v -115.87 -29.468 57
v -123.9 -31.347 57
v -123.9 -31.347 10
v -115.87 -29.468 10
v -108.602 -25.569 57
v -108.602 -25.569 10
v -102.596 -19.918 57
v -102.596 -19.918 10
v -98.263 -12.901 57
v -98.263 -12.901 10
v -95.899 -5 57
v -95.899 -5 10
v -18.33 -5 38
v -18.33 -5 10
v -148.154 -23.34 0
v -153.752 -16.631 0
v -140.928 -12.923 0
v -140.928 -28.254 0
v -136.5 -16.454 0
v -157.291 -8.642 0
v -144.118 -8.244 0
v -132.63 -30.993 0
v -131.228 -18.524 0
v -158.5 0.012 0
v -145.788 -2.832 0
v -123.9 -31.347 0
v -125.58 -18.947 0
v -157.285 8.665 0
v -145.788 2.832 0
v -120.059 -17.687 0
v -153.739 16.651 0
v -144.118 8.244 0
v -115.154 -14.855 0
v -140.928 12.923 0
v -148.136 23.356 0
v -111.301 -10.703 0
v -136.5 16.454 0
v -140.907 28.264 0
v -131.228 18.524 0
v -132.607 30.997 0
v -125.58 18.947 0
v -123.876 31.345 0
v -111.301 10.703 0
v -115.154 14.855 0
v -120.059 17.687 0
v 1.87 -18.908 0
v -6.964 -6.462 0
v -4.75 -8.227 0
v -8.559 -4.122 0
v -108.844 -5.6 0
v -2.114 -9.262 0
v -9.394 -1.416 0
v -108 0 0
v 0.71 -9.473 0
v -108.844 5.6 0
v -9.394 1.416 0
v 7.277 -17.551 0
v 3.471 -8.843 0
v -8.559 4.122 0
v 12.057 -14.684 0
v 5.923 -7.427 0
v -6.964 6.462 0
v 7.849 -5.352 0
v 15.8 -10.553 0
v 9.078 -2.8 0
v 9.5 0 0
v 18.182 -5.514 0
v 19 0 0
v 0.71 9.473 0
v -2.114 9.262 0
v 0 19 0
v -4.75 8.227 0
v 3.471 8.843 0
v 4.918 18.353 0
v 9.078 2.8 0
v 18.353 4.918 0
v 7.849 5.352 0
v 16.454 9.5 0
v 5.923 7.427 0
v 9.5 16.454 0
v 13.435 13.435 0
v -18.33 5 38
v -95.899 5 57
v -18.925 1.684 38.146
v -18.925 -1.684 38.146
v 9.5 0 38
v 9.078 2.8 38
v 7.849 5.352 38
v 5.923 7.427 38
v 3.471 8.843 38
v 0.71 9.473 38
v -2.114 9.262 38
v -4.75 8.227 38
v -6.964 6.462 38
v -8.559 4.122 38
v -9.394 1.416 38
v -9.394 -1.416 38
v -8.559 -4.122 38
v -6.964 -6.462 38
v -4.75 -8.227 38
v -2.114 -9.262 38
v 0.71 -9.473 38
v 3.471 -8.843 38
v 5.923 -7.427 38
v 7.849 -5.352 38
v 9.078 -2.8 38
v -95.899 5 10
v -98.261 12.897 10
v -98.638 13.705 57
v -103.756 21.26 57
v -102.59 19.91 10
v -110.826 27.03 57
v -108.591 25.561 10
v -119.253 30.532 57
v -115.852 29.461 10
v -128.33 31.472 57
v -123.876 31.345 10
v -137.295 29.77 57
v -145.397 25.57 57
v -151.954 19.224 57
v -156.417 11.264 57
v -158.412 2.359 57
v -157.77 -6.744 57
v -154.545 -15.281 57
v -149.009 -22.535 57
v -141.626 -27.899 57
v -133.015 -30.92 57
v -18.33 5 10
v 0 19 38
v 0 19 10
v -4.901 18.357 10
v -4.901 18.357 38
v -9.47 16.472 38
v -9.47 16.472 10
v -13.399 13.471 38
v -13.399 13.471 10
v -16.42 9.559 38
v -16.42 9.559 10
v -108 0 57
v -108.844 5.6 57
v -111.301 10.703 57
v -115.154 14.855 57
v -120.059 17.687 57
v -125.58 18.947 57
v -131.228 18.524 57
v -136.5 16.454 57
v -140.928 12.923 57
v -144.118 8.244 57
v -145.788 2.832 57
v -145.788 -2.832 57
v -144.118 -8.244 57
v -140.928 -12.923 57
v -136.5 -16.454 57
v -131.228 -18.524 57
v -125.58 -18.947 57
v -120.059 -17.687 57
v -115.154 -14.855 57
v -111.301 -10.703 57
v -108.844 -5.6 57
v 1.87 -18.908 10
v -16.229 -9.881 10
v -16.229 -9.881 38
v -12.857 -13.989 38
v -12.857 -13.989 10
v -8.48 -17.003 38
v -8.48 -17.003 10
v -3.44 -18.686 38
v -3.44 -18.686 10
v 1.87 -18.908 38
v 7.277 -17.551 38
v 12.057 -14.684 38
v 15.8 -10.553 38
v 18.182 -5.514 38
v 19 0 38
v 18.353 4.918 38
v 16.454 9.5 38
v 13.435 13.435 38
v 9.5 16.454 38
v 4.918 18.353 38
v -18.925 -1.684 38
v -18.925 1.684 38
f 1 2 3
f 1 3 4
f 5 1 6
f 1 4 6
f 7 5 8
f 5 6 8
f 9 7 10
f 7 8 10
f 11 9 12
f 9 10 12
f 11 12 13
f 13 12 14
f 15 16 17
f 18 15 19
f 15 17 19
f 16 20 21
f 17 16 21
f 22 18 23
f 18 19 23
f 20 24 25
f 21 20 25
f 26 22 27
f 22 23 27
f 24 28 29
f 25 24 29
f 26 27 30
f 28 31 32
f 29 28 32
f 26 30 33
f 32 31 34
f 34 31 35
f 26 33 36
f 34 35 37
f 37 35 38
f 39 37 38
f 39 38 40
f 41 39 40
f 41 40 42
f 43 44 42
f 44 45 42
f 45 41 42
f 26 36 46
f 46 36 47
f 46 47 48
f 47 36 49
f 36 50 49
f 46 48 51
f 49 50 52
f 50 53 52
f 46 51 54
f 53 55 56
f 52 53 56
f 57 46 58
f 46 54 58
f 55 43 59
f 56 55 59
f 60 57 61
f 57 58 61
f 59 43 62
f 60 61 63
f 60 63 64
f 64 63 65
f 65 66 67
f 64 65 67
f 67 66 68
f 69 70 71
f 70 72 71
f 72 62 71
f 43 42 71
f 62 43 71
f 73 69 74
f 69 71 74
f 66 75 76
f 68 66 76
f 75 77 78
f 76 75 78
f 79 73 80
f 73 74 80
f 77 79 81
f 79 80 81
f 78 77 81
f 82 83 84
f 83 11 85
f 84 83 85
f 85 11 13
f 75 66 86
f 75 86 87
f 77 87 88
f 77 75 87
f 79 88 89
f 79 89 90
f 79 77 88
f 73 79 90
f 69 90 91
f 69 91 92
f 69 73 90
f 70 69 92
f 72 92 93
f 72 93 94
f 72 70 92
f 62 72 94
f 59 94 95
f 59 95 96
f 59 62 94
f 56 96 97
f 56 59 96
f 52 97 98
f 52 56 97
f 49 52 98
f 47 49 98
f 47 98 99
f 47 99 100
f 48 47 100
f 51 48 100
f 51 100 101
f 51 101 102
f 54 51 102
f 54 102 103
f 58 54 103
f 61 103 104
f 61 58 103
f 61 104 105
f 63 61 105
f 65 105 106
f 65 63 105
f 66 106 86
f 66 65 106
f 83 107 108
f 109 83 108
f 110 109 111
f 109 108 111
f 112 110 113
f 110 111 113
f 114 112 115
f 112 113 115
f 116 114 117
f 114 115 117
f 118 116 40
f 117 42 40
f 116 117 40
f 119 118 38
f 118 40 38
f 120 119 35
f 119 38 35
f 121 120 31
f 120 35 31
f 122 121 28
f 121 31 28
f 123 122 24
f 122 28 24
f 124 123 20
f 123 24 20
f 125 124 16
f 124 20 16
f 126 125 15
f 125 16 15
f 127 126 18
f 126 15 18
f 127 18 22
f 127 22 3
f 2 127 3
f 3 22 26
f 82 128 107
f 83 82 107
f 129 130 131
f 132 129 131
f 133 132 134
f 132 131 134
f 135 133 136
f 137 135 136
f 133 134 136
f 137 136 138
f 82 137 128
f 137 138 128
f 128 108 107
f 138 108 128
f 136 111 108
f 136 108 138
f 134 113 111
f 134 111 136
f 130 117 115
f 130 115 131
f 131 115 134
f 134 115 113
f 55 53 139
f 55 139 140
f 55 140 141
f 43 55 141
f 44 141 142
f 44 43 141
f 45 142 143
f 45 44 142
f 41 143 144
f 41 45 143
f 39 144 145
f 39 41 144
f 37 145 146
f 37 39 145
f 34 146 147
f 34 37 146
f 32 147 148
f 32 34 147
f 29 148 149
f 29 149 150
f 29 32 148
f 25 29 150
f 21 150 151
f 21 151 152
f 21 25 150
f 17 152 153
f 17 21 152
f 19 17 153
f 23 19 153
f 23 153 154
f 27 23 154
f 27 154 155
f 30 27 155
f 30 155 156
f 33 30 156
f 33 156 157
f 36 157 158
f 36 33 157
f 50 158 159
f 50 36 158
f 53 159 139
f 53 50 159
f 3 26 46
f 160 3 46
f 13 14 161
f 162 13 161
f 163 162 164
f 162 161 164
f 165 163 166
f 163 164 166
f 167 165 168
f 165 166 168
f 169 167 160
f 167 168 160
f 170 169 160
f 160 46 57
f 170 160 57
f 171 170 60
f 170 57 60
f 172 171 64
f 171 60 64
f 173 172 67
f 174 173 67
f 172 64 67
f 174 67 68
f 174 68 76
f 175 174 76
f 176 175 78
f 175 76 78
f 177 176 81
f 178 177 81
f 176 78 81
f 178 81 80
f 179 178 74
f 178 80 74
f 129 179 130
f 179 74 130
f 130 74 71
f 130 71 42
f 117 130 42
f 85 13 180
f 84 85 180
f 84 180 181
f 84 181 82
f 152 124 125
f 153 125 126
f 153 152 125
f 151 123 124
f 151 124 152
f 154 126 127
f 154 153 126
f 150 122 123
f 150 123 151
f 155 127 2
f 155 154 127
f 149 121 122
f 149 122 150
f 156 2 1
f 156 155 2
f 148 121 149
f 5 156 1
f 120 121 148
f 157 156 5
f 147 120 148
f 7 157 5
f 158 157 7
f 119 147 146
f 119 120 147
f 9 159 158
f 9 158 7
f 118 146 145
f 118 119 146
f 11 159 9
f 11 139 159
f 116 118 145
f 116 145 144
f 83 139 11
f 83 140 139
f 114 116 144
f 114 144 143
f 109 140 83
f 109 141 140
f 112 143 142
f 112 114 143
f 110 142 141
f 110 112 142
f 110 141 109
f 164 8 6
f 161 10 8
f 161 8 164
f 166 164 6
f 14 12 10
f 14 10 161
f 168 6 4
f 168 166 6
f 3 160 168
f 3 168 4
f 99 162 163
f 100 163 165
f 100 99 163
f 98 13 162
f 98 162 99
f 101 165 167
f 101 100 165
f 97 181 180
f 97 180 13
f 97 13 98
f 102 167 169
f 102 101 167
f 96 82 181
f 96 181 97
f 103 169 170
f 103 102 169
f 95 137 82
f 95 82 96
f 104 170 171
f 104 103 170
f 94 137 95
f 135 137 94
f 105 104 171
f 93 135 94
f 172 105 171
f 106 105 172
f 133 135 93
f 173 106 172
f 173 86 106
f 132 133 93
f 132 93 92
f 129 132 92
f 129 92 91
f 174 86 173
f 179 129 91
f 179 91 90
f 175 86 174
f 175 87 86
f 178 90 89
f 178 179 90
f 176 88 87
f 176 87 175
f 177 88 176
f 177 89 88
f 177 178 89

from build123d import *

# Parameters (mm, degrees)
F0_R     = 19
F1_DEPTH = 57
F2_DEPTH = 10
F0_R_2   = 9.5
F3_DEPTH = 38
F5_DEPTH = 57
F7_DEPTH = 36.501


with BuildPart() as f1:
    # F0 (on Top) → F1 (new body)
    with BuildSketch(Plane.XY):
        with BuildLine():
            ThreePointArc((-95.8993569198, 5), (-105.4051754039, 22.9328051198), (-123.8763790613, 31.3447442521))
            ThreePointArc((-123.8763790613, 31.3447442521), (-158.499997838, 0.011670713), (-123.8996062992, -31.3470502424))
            ThreePointArc((-123.8996062992, -31.3470502424), (-105.4136734635, -22.940804403), (-95.8993569198, -5))
            ThreePointArc((-95.8993569198, -5), (-95.5999979536, -2.50796162), (-95.5, 0))
            ThreePointArc((-95.5, 0), (-95.5999979536, 2.50796162), (-95.8993569198, 5))
        make_face()
        with Locations((-127, 0)):
            Circle(F0_R, mode=Mode.SUBTRACT)
    extrude(amount=F1_DEPTH)

    # F0 (on Top) → F2 (join)
    with BuildSketch(Plane.XY):
        with BuildLine():
            Line((-123.8996062992, -31.3470502424), (1.8700787402, -18.9077445907))
            ThreePointArc((1.8700787402, -18.9077445907), (-10.7745572419, -15.6495660081), (-18.3303027798, -5))
            Line((-18.3303027798, -5), (-95.8993569198, -5))
            ThreePointArc((-95.8993569198, -5), (-105.4136734635, -22.940804403), (-123.8996062992, -31.3470502424))
        make_face()
        with BuildLine():
            ThreePointArc((-18.3303027798, 5), (-11.5325625947, 15.0996688705), (0, 19))
            Line((0, 19), (-123.8763790613, 31.3447442521))
            ThreePointArc((-123.8763790613, 31.3447442521), (-105.4051754039, 22.9328051198), (-95.8993569198, 5))
            Line((-95.8993569198, 5), (-18.3303027798, 5))
        make_face()
    extrude(amount=F2_DEPTH)

    # F0 (on Top) → F3 (join)
    with BuildSketch(Plane.XY):
        with BuildLine():
            ThreePointArc((1.8700787402, -18.9077445907), (14.0806870582, -12.7567335932), (19, 0))
            ThreePointArc((19, 0), (13.4350288425, 13.4350288425), (0, 19))
            ThreePointArc((0, 19), (-11.5325625947, 15.0996688705), (-18.3303027798, 5))
            ThreePointArc((-18.3303027798, 5), (-19, 0), (-18.3303027798, -5))
            ThreePointArc((-18.3303027798, -5), (-10.7745572419, -15.6495660081), (1.8700787402, -18.9077445907))
        make_face()
        Circle(F0_R_2, mode=Mode.SUBTRACT)
    extrude(amount=F3_DEPTH)

    # F0 (on Top) → F5 (join)
    with BuildSketch(Plane.XY):
        with BuildLine():
            ThreePointArc((-18.3303027798, -5), (-19, 0), (-18.3303027798, 5))
            Line((-18.3303027798, 5), (-95.8993569198, 5))
            ThreePointArc((-95.8993569198, 5), (-95.5999979536, 2.50796162), (-95.5, 0))
            ThreePointArc((-95.5, 0), (-95.5999979536, -2.50796162), (-95.8993569198, -5))
            Line((-95.8993569198, -5), (-18.3303027798, -5))
        make_face()
    extrude(amount=F5_DEPTH)

    # F6 (on face) → F7 (cut, through all)
    with BuildSketch(Plane.XZ.offset(5)):
        Polygon((-18.3303027798, 57), (-95.8993569198, 57), (-18.3303027798, 38), align=None)
    extrude(amount=-F7_DEPTH, mode=Mode.SUBTRACT)


solid = f1.part
